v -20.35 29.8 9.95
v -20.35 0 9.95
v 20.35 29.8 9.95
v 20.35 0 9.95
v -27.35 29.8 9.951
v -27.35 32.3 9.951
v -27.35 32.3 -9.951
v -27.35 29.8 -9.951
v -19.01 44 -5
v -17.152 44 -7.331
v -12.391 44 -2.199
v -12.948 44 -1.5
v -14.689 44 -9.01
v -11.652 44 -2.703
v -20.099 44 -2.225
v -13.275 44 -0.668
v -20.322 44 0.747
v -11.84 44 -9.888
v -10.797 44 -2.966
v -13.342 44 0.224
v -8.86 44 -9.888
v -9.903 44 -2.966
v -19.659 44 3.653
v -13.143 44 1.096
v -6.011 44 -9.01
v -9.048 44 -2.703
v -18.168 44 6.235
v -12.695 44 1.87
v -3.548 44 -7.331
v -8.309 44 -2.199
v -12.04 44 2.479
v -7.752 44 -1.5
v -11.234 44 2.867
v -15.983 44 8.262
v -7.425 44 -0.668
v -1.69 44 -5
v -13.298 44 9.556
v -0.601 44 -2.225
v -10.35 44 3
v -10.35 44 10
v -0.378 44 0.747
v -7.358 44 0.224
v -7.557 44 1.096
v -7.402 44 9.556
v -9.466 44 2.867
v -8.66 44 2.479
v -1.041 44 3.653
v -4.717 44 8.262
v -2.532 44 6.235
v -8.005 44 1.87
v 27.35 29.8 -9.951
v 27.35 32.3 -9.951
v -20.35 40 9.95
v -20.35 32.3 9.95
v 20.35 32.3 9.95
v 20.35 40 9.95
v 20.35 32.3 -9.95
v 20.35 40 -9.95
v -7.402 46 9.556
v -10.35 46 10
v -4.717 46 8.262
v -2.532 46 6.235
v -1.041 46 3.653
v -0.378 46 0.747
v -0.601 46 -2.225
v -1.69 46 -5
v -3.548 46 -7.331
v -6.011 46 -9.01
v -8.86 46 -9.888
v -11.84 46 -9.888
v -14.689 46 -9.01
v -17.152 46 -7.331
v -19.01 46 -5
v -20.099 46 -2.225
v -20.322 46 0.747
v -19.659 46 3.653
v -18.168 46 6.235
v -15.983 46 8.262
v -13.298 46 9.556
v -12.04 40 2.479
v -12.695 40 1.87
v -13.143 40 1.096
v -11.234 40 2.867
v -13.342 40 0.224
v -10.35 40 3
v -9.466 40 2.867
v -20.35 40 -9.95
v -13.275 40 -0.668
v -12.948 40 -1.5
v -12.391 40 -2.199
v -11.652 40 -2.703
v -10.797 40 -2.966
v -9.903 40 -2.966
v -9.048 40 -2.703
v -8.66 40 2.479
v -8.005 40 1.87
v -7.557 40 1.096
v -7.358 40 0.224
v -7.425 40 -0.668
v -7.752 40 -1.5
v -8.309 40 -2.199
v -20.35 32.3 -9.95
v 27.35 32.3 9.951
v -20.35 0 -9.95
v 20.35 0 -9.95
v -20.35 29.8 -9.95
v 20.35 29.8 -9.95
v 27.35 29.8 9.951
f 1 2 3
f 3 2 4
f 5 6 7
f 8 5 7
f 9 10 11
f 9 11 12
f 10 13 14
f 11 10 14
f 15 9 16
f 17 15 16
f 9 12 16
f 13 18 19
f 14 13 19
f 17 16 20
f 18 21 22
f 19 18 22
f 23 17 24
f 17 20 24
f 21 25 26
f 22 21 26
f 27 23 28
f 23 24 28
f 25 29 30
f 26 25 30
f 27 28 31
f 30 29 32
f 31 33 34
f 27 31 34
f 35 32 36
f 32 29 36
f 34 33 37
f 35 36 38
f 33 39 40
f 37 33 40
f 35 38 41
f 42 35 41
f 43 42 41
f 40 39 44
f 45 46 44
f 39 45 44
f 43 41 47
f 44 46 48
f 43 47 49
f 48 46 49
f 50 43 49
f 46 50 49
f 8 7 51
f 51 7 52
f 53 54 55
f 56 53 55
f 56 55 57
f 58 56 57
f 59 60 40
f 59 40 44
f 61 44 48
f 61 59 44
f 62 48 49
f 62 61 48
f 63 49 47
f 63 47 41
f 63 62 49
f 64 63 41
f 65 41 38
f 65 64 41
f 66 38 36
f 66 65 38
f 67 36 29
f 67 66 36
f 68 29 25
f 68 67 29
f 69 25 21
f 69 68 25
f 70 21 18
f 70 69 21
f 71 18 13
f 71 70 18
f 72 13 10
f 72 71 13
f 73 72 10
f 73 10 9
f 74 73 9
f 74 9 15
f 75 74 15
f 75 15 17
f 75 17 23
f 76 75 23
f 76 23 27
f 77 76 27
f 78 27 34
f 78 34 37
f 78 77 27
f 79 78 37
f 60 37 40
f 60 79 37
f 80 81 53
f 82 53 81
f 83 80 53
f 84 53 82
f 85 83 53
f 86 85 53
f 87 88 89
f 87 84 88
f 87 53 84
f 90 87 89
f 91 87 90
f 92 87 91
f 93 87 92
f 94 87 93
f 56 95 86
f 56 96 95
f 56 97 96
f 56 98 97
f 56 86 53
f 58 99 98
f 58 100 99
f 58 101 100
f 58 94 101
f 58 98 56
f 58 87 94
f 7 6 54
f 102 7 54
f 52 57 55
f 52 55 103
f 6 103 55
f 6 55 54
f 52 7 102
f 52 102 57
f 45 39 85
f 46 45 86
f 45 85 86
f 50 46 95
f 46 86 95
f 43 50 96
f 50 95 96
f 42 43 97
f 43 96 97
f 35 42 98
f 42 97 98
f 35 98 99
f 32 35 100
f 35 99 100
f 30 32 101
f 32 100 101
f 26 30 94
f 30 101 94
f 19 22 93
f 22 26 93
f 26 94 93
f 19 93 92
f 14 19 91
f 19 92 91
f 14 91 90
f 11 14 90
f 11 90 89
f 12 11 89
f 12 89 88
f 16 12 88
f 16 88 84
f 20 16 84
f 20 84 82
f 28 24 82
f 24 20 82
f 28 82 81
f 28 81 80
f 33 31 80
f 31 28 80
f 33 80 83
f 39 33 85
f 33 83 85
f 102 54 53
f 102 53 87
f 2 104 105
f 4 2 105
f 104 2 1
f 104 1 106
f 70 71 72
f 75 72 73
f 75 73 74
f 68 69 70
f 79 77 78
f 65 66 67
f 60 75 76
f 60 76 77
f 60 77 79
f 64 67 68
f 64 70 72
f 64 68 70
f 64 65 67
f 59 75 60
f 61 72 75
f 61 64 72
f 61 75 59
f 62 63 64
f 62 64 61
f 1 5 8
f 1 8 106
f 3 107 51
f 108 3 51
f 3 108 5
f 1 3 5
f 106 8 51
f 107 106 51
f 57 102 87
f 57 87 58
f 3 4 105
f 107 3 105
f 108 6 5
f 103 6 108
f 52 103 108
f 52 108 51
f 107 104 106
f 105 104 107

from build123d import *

# Parameters (mm, degrees)
SKETCH_1_W      = 40.7
SKETCH_1_H      = 19.9
EXTRUDE_1_DEPTH = 40
SKETCH_2_R      = 3
EXTRUDE_2_DEPTH = 6
EXTRUDE_START   = -7.7
SKETCH_3_W      = 54.7
SKETCH_3_H      = 19.901230414
EXTRUDE_3_DEPTH = 2.5
SKETCH_4_R      = 10
EXTRUDE_4_DEPTH = 2


with BuildPart() as part:
    # 스케치1 → 보스-돌출1 (new body)
    with BuildSketch(Plane(origin=(0, 0, 0), x_dir=(1, 0, 0), z_dir=(0, 1, 0))):
        Rectangle(SKETCH_1_W, SKETCH_1_H)
    extrude(amount=EXTRUDE_1_DEPTH)

    # 스케치2 → 보스-돌출2 (add)
    with BuildSketch(Plane(origin=(0, 40, 0), x_dir=(1, 0, 0), z_dir=(0, 1, 0))):
        with Locations(Location((-10.35, 0, 0), (0, 0, 270))):
            Circle(SKETCH_2_R)
    extrude(amount=EXTRUDE_2_DEPTH)

    # 스케치3 → 보스-돌출3 (add)
    with BuildSketch(Plane(origin=(0, 40, 0), x_dir=(1, 0, 0), z_dir=(0, 1, 0)).offset(EXTRUDE_START)):
        Rectangle(SKETCH_3_W, SKETCH_3_H)
    extrude(amount=-EXTRUDE_3_DEPTH)

    # 스케치4 → 보스-돌출4 (add)
    with BuildSketch(Plane(origin=(0, 46, 0), x_dir=(1, 0, 0), z_dir=(0, 1, 0))):
        with Locations(Location((-10.35, 0, 0), (0, 0, 270))):
            Circle(SKETCH_4_R)
    extrude(amount=-EXTRUDE_4_DEPTH)


solid = part.part
